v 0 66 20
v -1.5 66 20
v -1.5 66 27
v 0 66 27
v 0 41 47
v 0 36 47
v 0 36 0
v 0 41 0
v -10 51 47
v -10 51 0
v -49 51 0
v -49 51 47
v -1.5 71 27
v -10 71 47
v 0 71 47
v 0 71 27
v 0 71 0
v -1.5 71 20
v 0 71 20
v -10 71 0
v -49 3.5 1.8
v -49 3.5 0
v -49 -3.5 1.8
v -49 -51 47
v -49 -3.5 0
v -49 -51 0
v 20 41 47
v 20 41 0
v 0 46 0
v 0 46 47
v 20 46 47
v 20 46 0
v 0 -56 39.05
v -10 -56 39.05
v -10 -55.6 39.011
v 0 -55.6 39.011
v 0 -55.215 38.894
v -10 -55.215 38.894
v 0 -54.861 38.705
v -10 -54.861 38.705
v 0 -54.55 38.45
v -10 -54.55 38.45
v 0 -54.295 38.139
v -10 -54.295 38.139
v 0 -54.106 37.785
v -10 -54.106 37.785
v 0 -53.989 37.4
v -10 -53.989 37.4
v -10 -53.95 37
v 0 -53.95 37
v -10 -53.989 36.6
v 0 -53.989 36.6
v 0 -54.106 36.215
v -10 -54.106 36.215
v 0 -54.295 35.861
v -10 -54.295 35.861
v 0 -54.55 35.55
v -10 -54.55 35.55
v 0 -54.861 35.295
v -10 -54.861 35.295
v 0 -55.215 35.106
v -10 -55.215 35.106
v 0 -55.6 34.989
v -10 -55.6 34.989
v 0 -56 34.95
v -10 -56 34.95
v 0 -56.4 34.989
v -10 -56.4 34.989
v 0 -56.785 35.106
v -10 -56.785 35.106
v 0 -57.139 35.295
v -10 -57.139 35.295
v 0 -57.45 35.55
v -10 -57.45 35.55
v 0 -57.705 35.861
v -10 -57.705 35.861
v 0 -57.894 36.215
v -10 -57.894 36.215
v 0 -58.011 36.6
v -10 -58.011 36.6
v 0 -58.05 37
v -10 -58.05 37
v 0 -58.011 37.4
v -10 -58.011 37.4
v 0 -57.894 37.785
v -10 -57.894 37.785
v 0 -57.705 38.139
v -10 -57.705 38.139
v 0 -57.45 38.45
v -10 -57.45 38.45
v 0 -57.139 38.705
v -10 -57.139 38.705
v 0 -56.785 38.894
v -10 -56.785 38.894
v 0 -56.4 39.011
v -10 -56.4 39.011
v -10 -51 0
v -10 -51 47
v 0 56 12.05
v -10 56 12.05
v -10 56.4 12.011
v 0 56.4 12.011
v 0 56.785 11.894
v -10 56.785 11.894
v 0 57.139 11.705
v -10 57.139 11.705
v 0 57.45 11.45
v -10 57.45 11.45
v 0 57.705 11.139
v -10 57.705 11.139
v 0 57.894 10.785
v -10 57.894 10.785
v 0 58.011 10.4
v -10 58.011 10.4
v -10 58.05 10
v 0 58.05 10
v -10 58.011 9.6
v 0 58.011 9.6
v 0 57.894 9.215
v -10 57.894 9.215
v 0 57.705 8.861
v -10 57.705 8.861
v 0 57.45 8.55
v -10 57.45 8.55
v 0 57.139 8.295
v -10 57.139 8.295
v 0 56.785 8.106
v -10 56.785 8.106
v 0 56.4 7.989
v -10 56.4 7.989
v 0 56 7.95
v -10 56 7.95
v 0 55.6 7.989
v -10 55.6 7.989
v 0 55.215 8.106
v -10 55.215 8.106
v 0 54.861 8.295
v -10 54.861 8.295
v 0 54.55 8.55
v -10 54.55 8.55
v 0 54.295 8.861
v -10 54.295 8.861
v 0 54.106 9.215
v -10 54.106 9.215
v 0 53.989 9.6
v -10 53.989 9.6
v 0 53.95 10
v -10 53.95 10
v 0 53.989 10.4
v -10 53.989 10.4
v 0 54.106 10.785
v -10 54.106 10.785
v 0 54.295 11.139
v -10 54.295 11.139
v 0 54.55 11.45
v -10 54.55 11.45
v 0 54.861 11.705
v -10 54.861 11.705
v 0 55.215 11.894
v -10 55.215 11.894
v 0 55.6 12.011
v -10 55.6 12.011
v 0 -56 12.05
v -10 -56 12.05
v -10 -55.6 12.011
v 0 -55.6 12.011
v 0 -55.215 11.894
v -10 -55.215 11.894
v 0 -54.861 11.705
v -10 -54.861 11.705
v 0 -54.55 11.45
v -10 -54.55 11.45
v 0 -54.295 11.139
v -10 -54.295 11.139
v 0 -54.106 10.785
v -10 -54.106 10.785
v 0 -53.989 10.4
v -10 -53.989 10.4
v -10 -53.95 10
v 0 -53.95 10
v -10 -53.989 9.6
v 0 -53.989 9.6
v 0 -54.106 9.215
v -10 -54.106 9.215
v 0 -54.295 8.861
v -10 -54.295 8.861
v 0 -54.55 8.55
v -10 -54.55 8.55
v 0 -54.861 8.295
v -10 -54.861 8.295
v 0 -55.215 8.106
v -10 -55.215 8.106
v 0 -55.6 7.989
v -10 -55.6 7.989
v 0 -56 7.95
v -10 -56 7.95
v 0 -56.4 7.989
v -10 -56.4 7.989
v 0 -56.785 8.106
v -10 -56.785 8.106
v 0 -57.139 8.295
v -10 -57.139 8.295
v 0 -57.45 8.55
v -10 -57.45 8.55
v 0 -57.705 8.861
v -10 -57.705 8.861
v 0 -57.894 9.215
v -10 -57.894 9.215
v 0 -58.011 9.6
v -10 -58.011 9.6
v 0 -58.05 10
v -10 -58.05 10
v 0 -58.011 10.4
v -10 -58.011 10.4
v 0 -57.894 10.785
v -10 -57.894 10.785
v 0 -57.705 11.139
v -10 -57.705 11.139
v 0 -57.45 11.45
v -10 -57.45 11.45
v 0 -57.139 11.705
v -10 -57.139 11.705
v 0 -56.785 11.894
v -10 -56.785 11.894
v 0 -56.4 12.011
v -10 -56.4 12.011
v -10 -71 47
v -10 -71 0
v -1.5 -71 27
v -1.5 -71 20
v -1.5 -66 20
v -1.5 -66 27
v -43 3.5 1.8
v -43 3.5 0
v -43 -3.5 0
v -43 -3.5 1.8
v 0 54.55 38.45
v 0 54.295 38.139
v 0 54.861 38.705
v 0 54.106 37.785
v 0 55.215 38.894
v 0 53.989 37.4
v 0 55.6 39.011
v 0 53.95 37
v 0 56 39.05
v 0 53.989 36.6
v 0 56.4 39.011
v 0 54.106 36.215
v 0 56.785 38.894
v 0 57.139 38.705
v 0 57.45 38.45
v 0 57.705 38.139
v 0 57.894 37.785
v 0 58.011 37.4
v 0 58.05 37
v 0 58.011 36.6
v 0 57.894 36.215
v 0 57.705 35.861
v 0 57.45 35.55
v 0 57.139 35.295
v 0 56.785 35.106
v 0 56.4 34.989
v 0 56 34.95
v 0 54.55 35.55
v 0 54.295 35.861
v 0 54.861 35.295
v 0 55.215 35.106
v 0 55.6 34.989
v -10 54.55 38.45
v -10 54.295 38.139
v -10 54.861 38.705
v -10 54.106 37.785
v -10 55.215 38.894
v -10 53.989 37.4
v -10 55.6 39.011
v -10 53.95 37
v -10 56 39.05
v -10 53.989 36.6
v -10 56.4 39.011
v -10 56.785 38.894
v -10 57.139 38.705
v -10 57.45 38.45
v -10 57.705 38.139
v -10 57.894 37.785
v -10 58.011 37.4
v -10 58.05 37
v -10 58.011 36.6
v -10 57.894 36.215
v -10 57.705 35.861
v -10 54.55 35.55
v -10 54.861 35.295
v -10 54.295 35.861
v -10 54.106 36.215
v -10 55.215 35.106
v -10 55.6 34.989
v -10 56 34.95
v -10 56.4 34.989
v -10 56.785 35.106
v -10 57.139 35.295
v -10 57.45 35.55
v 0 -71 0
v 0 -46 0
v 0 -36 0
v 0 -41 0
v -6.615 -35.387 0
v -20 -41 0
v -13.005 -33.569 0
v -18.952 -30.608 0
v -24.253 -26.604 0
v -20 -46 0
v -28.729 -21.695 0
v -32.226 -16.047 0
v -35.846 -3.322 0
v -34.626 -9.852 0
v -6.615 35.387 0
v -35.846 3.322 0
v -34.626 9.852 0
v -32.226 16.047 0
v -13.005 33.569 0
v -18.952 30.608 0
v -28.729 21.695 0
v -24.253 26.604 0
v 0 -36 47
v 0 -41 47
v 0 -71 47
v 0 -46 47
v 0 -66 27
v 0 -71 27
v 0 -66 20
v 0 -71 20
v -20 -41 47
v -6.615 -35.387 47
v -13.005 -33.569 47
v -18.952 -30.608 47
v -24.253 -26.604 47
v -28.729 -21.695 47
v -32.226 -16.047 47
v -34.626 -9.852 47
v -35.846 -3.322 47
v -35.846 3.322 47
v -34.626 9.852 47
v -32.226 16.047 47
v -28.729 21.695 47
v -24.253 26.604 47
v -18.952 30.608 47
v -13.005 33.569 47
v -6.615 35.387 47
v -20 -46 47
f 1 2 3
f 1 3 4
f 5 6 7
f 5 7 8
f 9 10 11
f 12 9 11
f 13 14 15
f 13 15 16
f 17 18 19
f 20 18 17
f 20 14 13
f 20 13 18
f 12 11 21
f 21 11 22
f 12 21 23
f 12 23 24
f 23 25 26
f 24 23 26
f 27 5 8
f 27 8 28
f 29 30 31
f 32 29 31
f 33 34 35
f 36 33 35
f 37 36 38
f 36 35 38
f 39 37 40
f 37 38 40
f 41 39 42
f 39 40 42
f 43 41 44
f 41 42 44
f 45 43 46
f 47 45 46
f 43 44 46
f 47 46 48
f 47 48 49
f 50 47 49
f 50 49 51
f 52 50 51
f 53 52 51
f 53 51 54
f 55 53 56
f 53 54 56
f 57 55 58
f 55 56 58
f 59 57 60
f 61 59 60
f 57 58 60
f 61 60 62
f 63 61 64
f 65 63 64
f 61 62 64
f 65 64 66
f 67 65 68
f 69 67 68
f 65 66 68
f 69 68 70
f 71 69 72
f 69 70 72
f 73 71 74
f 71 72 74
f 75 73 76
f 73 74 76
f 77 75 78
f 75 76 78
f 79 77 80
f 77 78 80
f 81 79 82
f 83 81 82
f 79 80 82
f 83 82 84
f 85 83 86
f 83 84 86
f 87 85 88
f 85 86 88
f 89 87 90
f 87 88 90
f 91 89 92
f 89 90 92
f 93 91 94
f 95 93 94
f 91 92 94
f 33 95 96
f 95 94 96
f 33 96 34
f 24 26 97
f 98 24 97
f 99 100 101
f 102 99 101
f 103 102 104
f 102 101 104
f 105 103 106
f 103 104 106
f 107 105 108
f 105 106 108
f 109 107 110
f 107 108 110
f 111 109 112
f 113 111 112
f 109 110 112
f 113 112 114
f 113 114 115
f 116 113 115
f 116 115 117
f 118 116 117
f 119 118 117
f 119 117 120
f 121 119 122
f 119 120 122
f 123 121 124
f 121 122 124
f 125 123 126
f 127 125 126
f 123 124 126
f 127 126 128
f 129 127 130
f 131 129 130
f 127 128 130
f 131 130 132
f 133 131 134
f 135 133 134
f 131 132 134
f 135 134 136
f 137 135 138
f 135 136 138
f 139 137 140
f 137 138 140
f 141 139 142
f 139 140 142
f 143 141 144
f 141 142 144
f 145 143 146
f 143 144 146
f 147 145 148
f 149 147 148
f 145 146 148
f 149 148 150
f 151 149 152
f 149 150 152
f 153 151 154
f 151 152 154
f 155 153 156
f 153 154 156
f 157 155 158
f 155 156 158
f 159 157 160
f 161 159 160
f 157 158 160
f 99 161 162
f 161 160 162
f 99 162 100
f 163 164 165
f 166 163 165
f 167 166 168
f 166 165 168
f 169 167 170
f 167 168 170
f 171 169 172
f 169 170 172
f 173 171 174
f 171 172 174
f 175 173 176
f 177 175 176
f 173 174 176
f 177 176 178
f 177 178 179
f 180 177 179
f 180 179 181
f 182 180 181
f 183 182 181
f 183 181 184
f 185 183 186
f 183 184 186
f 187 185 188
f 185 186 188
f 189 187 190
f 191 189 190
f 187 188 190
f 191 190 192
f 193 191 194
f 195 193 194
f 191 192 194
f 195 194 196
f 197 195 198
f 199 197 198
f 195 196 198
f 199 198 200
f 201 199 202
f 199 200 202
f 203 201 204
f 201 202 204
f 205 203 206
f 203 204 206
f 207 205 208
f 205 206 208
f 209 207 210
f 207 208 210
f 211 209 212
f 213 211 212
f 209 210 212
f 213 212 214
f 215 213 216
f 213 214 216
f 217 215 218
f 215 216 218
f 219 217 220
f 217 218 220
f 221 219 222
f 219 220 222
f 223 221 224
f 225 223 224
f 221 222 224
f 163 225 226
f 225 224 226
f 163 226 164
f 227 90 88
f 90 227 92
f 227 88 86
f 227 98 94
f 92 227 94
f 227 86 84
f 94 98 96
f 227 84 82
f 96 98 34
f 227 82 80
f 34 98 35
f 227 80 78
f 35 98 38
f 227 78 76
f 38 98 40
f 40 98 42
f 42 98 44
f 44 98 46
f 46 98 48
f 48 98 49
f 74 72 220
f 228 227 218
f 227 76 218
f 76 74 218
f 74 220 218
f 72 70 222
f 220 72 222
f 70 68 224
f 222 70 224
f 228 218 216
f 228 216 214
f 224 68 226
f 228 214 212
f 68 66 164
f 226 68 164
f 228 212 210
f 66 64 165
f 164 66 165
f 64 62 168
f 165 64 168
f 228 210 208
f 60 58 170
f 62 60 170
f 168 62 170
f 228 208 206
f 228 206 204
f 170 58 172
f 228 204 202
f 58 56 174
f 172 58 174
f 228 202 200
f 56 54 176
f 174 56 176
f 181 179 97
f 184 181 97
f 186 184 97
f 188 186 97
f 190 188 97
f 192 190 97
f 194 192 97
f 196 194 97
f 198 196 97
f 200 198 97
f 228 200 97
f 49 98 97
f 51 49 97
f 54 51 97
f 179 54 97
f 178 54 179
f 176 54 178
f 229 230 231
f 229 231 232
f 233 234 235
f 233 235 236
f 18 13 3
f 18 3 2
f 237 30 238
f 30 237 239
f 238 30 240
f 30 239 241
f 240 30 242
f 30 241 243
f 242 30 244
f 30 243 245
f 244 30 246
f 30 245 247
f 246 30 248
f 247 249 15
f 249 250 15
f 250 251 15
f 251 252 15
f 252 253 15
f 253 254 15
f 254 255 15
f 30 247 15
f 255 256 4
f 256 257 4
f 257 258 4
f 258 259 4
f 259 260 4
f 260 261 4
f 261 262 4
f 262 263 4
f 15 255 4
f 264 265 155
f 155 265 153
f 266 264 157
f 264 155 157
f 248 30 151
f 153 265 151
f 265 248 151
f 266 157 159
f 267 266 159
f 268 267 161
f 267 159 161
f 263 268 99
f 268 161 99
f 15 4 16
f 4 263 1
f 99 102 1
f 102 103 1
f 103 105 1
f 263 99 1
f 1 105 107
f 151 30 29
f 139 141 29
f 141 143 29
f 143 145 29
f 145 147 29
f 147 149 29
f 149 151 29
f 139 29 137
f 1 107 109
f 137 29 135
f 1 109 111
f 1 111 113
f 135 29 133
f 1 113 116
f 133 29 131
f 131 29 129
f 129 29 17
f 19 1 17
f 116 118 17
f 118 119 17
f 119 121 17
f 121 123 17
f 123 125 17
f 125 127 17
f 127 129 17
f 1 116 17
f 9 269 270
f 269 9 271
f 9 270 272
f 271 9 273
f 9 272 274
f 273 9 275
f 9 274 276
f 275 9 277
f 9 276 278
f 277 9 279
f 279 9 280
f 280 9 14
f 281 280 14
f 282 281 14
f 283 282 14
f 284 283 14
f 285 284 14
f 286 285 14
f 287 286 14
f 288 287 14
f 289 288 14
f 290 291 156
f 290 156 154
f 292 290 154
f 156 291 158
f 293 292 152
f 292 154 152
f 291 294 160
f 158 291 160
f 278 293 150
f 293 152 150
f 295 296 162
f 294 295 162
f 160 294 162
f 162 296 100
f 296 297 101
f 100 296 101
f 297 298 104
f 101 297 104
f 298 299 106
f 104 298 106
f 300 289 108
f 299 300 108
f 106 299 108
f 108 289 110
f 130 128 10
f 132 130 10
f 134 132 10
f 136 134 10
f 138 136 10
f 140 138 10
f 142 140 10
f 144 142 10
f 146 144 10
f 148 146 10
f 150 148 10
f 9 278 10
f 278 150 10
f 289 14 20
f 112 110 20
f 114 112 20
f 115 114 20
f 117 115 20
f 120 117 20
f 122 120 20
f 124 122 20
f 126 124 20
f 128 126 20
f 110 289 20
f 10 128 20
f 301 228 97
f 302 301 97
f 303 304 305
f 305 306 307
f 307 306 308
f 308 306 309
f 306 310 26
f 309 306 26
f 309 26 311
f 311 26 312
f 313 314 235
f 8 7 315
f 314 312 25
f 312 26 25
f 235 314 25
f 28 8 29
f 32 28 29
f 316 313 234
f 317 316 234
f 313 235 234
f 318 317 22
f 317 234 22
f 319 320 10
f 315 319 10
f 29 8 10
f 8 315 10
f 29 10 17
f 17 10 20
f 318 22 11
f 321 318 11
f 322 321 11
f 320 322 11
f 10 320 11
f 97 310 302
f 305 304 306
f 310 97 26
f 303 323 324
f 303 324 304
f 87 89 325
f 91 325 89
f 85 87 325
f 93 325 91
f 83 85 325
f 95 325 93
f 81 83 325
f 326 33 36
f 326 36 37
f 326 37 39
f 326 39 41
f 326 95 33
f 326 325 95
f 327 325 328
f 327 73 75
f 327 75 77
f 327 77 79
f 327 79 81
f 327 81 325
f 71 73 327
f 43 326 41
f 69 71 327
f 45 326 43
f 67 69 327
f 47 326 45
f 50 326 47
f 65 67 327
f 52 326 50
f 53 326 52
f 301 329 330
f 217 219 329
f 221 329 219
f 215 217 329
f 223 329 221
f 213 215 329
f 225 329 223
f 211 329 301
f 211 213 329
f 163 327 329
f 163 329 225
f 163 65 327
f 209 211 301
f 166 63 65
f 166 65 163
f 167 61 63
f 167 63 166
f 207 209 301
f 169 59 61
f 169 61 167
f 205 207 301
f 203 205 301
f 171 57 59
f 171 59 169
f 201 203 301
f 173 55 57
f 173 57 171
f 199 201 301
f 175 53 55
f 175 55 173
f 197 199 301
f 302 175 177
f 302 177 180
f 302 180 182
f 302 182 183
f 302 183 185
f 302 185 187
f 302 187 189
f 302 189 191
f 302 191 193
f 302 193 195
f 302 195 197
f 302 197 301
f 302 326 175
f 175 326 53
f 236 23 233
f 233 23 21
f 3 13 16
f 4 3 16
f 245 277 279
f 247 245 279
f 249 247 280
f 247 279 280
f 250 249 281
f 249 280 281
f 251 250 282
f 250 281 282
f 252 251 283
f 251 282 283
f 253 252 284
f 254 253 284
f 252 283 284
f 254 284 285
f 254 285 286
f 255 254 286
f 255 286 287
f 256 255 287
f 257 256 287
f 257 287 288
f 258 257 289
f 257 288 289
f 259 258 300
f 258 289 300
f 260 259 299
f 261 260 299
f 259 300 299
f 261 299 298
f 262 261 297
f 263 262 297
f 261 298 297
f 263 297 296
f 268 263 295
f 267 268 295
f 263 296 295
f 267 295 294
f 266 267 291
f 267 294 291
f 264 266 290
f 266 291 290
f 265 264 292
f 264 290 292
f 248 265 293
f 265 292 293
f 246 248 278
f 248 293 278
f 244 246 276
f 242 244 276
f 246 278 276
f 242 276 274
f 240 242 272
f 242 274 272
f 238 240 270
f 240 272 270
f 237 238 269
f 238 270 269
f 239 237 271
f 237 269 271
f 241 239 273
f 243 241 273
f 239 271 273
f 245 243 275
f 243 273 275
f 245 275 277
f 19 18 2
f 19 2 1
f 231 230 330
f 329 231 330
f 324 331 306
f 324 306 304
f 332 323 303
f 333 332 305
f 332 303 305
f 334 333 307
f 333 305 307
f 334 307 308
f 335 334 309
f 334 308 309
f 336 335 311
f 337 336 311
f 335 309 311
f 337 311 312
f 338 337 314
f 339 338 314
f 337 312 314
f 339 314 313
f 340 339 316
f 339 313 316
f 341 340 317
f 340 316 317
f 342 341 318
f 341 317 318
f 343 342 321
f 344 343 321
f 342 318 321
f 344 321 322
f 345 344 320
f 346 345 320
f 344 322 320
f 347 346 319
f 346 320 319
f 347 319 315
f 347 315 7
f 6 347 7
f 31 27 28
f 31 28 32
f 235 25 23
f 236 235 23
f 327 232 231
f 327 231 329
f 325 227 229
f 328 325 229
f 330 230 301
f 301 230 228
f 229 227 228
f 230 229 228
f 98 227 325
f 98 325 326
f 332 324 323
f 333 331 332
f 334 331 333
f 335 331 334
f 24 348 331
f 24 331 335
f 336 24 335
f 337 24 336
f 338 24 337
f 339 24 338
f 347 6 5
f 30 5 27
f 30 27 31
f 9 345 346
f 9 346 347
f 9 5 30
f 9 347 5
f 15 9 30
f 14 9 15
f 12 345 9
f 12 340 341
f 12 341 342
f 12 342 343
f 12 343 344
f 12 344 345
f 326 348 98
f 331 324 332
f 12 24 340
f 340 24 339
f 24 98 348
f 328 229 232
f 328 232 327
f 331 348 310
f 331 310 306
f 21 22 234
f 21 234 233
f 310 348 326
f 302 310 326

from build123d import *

# Parameters (mm, degrees)
EXTRUDE_1_DEPTH     = 47
SKETCH_2_W          = 47
SKETCH_2_H          = 20
EXTRUDE_2_DEPTH     = 10
SKETCH_3_W          = 20
SKETCH_3_H          = 5
EXTRUDE_3_DEPTH     = 47
SKETCH_4_W          = 20
SKETCH_4_H          = 5
CUT_EXTRUDE_1_DEPTH = 99.239503256
SKETCH_5_R          = 2.05
CUT_EXTRUDE_2_DEPTH = 10
SKETCH_6_R          = 2.05
CUT_EXTRUDE_3_DEPTH = 10
SKETCH_7_W          = 1.5
SKETCH_7_H          = 7
CUT_EXTRUDE_4_DEPTH = 5
SKETCH_8_W          = 1.5
SKETCH_8_H          = 7
CUT_EXTRUDE_5_DEPTH = 5
SKETCH_9_W          = 1.8
SKETCH_9_H          = 7
CUT_EXTRUDE_6_DEPTH = 6


with BuildPart() as part:
    # 草图1 → 凸台-拉伸1 (new body)
    with BuildSketch(Plane.XY):
        with BuildLine():
            Line((0, 36), (0, 51))
            Line((0, 51), (-49, 51))
            Line((-49, 51), (-49, -51))
            Line((-49, -51), (0, -51))
            Line((0, -51), (0, -36))
            ThreePointArc((0, -36), (-36, 0), (0, 36))
        make_face()
    extrude(amount=EXTRUDE_1_DEPTH)

    # 草图2 → 凸台-拉伸2 (add)
    with BuildSketch(Plane(origin=(-10, 0, 0), x_dir=(0, 0, -1), z_dir=(1, 0, 0))):
        with Locations((-23.5, -61)):
            Rectangle(SKETCH_2_W, SKETCH_2_H)
        with Locations((-23.5, 61)):
            Rectangle(SKETCH_2_W, SKETCH_2_H)
    extrude(amount=EXTRUDE_2_DEPTH)

    # 草图3 → 凸台-拉伸3 (add, through all)
    with BuildSketch(Plane.XY.offset(47)):
        with Locations((10, 43.5)):
            Rectangle(SKETCH_3_W, SKETCH_3_H)
    extrude(amount=-EXTRUDE_3_DEPTH)

    # 草图4 → 切除-拉伸1 (cut, through all)
    with BuildSketch(Plane.XY.offset(47)):
        with Locations((-10, -43.5)):
            Rectangle(SKETCH_4_W, SKETCH_4_H)
    extrude(amount=-CUT_EXTRUDE_1_DEPTH, mode=Mode.SUBTRACT)

    # 草图5 → 切除-拉伸2 (cut)
    with BuildSketch(Plane.ZY.offset(10)):
        with Locations((10, -56)):
            Circle(SKETCH_5_R)
        with Locations((37, -56)):
            Circle(SKETCH_5_R)
    extrude(amount=-CUT_EXTRUDE_2_DEPTH, mode=Mode.SUBTRACT)

    # 草图6 → 切除-拉伸3 (cut)
    with BuildSketch(Plane.ZY.offset(10)):
        with Locations((10, 56)):
            Circle(SKETCH_6_R)
        with Locations((37, 56)):
            Circle(SKETCH_6_R)
    extrude(amount=-CUT_EXTRUDE_3_DEPTH, mode=Mode.SUBTRACT)

    # 草图7 → 切除-拉伸4 (cut)
    with BuildSketch(Plane.XZ.offset(71)):
        with Locations((-0.75, 23.5)):
            Rectangle(SKETCH_7_W, SKETCH_7_H)
    extrude(amount=-CUT_EXTRUDE_4_DEPTH, mode=Mode.SUBTRACT)

    # 草图8 → 切除-拉伸5 (cut)
    with BuildSketch(Plane(origin=(0, 71, 0), x_dir=(1, 0, 0), z_dir=(0, 1, 0))):
        with Locations((-0.75, -23.5)):
            Rectangle(SKETCH_8_W, SKETCH_8_H)
    extrude(amount=-CUT_EXTRUDE_5_DEPTH, mode=Mode.SUBTRACT)

    # 草图9 → 切除-拉伸6 (cut)
    with BuildSketch(Plane.ZY.offset(49)):
        with Locations((0.9, 0)):
            Rectangle(SKETCH_9_W, SKETCH_9_H)
    extrude(amount=-CUT_EXTRUDE_6_DEPTH, mode=Mode.SUBTRACT)


solid = part.part
